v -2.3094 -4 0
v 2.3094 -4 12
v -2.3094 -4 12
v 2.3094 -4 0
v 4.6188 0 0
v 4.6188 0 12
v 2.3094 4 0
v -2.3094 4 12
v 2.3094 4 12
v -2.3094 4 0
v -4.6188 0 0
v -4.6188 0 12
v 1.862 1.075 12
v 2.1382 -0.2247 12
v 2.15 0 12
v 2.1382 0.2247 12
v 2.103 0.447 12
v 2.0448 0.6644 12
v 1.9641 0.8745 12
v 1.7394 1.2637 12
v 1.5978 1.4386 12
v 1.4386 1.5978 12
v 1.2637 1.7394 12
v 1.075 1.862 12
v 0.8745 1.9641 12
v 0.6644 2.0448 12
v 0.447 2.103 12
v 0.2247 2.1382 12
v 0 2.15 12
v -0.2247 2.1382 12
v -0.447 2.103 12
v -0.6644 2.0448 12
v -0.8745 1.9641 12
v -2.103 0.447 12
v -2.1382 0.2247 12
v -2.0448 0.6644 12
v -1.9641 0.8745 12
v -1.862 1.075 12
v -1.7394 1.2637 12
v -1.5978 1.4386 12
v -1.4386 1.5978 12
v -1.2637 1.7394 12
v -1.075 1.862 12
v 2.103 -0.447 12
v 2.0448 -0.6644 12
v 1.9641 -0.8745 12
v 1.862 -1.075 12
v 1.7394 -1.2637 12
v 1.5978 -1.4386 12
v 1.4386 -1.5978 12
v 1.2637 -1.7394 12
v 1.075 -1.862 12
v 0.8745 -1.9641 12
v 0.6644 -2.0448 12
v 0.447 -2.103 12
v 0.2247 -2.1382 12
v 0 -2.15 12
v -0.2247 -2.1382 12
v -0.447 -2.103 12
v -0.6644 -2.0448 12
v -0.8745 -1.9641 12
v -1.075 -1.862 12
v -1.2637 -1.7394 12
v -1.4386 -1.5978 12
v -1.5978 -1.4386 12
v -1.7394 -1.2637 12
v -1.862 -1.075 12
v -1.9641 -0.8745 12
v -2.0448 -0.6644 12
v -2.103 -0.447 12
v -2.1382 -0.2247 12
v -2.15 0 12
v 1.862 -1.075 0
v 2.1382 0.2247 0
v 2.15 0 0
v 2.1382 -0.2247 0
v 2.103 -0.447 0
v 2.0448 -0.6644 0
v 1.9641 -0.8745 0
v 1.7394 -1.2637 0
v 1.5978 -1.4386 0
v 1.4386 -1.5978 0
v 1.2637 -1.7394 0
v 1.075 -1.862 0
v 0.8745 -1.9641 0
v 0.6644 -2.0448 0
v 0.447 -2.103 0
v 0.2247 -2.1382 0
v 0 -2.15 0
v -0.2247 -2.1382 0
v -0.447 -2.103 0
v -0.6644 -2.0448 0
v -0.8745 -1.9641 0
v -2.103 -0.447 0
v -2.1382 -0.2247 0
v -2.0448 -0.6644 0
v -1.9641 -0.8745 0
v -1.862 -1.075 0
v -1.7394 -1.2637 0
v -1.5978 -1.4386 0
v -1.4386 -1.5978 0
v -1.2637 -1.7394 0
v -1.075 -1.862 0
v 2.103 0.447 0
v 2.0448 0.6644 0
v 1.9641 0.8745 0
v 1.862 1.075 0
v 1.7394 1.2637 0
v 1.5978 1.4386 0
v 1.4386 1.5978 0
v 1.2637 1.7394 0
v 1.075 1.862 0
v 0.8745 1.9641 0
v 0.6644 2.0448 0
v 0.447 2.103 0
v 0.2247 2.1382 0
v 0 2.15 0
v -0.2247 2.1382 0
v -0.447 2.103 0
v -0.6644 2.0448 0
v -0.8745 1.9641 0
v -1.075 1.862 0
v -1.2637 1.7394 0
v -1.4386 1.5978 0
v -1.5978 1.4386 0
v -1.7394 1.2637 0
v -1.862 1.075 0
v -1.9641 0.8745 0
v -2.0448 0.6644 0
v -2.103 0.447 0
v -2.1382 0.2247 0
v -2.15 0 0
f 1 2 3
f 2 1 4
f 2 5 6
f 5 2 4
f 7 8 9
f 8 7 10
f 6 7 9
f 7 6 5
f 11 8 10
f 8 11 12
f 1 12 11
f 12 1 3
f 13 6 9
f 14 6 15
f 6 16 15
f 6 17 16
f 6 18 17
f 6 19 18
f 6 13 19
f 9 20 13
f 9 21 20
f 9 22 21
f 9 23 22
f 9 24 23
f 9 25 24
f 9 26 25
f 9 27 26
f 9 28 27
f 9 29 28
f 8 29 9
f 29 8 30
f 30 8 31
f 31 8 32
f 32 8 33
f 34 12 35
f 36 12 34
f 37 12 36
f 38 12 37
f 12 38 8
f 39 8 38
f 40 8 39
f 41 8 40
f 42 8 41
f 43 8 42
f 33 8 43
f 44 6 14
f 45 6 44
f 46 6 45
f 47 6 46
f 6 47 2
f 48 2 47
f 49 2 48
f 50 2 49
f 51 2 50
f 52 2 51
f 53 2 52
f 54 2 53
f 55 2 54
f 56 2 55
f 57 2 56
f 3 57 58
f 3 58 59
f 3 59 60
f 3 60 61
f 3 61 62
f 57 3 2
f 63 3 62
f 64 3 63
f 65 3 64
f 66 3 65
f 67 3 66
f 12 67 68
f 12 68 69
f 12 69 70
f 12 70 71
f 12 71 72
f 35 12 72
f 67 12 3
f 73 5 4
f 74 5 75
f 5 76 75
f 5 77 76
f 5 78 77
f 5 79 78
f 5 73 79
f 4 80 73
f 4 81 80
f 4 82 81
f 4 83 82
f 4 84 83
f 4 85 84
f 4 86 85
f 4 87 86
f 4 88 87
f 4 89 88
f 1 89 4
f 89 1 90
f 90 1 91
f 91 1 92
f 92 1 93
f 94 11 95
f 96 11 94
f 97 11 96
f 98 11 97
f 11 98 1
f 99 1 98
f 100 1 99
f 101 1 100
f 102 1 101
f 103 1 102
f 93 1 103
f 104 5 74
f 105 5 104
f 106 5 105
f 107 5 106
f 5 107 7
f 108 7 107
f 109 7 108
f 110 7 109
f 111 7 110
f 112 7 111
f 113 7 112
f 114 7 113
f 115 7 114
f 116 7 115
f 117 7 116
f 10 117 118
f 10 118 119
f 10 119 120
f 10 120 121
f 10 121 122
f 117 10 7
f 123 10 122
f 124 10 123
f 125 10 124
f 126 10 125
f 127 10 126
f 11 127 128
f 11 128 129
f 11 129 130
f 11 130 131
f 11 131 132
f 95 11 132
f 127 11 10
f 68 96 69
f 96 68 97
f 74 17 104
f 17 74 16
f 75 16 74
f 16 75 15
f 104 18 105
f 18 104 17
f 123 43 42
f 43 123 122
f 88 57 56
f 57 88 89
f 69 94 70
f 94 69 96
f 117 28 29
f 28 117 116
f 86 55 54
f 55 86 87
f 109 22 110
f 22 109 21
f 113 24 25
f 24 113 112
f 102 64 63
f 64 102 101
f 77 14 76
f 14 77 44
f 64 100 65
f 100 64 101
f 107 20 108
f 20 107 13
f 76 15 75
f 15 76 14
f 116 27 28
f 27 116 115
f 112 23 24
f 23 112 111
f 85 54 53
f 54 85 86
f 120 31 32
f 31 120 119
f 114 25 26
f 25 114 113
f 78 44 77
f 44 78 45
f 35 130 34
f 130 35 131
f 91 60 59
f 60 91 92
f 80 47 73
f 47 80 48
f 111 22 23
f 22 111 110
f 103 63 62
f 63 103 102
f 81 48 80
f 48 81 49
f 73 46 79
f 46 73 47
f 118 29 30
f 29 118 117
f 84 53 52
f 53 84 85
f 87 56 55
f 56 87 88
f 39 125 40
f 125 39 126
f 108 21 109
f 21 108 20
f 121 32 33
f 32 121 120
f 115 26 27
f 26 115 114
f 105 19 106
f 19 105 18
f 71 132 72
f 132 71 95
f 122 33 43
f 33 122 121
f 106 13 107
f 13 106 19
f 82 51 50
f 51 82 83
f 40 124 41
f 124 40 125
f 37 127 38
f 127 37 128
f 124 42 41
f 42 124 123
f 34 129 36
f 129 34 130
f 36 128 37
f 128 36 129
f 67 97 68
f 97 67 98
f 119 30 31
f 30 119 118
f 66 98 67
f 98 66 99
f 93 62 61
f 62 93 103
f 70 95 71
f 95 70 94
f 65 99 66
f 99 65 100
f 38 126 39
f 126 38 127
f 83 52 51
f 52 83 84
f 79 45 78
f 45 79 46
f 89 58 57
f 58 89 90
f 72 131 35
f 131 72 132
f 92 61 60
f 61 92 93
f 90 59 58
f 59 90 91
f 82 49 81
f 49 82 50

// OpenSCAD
// Hex standoff, 12 mm long.
$fn = 60;
eps = 0.02;
thread_d = 4.3;
flat = 8;
length = 12;
chamfer = 1.2;
difference() {
    union() {
        cylinder(d = flat / cos(30), h = length, $fn = 6);
        cylinder(d1 = flat / cos(30) - 2 * chamfer, d2 = flat / cos(30), h = chamfer, $fn = 6);
        translate([0, 0, length - chamfer]) cylinder(d1 = flat / cos(30), d2 = flat / cos(30) - 2 * chamfer, h = chamfer, $fn = 6);
    }
    translate([0, 0, -eps]) cylinder(d = thread_d, h = length + 2 * eps);
}
